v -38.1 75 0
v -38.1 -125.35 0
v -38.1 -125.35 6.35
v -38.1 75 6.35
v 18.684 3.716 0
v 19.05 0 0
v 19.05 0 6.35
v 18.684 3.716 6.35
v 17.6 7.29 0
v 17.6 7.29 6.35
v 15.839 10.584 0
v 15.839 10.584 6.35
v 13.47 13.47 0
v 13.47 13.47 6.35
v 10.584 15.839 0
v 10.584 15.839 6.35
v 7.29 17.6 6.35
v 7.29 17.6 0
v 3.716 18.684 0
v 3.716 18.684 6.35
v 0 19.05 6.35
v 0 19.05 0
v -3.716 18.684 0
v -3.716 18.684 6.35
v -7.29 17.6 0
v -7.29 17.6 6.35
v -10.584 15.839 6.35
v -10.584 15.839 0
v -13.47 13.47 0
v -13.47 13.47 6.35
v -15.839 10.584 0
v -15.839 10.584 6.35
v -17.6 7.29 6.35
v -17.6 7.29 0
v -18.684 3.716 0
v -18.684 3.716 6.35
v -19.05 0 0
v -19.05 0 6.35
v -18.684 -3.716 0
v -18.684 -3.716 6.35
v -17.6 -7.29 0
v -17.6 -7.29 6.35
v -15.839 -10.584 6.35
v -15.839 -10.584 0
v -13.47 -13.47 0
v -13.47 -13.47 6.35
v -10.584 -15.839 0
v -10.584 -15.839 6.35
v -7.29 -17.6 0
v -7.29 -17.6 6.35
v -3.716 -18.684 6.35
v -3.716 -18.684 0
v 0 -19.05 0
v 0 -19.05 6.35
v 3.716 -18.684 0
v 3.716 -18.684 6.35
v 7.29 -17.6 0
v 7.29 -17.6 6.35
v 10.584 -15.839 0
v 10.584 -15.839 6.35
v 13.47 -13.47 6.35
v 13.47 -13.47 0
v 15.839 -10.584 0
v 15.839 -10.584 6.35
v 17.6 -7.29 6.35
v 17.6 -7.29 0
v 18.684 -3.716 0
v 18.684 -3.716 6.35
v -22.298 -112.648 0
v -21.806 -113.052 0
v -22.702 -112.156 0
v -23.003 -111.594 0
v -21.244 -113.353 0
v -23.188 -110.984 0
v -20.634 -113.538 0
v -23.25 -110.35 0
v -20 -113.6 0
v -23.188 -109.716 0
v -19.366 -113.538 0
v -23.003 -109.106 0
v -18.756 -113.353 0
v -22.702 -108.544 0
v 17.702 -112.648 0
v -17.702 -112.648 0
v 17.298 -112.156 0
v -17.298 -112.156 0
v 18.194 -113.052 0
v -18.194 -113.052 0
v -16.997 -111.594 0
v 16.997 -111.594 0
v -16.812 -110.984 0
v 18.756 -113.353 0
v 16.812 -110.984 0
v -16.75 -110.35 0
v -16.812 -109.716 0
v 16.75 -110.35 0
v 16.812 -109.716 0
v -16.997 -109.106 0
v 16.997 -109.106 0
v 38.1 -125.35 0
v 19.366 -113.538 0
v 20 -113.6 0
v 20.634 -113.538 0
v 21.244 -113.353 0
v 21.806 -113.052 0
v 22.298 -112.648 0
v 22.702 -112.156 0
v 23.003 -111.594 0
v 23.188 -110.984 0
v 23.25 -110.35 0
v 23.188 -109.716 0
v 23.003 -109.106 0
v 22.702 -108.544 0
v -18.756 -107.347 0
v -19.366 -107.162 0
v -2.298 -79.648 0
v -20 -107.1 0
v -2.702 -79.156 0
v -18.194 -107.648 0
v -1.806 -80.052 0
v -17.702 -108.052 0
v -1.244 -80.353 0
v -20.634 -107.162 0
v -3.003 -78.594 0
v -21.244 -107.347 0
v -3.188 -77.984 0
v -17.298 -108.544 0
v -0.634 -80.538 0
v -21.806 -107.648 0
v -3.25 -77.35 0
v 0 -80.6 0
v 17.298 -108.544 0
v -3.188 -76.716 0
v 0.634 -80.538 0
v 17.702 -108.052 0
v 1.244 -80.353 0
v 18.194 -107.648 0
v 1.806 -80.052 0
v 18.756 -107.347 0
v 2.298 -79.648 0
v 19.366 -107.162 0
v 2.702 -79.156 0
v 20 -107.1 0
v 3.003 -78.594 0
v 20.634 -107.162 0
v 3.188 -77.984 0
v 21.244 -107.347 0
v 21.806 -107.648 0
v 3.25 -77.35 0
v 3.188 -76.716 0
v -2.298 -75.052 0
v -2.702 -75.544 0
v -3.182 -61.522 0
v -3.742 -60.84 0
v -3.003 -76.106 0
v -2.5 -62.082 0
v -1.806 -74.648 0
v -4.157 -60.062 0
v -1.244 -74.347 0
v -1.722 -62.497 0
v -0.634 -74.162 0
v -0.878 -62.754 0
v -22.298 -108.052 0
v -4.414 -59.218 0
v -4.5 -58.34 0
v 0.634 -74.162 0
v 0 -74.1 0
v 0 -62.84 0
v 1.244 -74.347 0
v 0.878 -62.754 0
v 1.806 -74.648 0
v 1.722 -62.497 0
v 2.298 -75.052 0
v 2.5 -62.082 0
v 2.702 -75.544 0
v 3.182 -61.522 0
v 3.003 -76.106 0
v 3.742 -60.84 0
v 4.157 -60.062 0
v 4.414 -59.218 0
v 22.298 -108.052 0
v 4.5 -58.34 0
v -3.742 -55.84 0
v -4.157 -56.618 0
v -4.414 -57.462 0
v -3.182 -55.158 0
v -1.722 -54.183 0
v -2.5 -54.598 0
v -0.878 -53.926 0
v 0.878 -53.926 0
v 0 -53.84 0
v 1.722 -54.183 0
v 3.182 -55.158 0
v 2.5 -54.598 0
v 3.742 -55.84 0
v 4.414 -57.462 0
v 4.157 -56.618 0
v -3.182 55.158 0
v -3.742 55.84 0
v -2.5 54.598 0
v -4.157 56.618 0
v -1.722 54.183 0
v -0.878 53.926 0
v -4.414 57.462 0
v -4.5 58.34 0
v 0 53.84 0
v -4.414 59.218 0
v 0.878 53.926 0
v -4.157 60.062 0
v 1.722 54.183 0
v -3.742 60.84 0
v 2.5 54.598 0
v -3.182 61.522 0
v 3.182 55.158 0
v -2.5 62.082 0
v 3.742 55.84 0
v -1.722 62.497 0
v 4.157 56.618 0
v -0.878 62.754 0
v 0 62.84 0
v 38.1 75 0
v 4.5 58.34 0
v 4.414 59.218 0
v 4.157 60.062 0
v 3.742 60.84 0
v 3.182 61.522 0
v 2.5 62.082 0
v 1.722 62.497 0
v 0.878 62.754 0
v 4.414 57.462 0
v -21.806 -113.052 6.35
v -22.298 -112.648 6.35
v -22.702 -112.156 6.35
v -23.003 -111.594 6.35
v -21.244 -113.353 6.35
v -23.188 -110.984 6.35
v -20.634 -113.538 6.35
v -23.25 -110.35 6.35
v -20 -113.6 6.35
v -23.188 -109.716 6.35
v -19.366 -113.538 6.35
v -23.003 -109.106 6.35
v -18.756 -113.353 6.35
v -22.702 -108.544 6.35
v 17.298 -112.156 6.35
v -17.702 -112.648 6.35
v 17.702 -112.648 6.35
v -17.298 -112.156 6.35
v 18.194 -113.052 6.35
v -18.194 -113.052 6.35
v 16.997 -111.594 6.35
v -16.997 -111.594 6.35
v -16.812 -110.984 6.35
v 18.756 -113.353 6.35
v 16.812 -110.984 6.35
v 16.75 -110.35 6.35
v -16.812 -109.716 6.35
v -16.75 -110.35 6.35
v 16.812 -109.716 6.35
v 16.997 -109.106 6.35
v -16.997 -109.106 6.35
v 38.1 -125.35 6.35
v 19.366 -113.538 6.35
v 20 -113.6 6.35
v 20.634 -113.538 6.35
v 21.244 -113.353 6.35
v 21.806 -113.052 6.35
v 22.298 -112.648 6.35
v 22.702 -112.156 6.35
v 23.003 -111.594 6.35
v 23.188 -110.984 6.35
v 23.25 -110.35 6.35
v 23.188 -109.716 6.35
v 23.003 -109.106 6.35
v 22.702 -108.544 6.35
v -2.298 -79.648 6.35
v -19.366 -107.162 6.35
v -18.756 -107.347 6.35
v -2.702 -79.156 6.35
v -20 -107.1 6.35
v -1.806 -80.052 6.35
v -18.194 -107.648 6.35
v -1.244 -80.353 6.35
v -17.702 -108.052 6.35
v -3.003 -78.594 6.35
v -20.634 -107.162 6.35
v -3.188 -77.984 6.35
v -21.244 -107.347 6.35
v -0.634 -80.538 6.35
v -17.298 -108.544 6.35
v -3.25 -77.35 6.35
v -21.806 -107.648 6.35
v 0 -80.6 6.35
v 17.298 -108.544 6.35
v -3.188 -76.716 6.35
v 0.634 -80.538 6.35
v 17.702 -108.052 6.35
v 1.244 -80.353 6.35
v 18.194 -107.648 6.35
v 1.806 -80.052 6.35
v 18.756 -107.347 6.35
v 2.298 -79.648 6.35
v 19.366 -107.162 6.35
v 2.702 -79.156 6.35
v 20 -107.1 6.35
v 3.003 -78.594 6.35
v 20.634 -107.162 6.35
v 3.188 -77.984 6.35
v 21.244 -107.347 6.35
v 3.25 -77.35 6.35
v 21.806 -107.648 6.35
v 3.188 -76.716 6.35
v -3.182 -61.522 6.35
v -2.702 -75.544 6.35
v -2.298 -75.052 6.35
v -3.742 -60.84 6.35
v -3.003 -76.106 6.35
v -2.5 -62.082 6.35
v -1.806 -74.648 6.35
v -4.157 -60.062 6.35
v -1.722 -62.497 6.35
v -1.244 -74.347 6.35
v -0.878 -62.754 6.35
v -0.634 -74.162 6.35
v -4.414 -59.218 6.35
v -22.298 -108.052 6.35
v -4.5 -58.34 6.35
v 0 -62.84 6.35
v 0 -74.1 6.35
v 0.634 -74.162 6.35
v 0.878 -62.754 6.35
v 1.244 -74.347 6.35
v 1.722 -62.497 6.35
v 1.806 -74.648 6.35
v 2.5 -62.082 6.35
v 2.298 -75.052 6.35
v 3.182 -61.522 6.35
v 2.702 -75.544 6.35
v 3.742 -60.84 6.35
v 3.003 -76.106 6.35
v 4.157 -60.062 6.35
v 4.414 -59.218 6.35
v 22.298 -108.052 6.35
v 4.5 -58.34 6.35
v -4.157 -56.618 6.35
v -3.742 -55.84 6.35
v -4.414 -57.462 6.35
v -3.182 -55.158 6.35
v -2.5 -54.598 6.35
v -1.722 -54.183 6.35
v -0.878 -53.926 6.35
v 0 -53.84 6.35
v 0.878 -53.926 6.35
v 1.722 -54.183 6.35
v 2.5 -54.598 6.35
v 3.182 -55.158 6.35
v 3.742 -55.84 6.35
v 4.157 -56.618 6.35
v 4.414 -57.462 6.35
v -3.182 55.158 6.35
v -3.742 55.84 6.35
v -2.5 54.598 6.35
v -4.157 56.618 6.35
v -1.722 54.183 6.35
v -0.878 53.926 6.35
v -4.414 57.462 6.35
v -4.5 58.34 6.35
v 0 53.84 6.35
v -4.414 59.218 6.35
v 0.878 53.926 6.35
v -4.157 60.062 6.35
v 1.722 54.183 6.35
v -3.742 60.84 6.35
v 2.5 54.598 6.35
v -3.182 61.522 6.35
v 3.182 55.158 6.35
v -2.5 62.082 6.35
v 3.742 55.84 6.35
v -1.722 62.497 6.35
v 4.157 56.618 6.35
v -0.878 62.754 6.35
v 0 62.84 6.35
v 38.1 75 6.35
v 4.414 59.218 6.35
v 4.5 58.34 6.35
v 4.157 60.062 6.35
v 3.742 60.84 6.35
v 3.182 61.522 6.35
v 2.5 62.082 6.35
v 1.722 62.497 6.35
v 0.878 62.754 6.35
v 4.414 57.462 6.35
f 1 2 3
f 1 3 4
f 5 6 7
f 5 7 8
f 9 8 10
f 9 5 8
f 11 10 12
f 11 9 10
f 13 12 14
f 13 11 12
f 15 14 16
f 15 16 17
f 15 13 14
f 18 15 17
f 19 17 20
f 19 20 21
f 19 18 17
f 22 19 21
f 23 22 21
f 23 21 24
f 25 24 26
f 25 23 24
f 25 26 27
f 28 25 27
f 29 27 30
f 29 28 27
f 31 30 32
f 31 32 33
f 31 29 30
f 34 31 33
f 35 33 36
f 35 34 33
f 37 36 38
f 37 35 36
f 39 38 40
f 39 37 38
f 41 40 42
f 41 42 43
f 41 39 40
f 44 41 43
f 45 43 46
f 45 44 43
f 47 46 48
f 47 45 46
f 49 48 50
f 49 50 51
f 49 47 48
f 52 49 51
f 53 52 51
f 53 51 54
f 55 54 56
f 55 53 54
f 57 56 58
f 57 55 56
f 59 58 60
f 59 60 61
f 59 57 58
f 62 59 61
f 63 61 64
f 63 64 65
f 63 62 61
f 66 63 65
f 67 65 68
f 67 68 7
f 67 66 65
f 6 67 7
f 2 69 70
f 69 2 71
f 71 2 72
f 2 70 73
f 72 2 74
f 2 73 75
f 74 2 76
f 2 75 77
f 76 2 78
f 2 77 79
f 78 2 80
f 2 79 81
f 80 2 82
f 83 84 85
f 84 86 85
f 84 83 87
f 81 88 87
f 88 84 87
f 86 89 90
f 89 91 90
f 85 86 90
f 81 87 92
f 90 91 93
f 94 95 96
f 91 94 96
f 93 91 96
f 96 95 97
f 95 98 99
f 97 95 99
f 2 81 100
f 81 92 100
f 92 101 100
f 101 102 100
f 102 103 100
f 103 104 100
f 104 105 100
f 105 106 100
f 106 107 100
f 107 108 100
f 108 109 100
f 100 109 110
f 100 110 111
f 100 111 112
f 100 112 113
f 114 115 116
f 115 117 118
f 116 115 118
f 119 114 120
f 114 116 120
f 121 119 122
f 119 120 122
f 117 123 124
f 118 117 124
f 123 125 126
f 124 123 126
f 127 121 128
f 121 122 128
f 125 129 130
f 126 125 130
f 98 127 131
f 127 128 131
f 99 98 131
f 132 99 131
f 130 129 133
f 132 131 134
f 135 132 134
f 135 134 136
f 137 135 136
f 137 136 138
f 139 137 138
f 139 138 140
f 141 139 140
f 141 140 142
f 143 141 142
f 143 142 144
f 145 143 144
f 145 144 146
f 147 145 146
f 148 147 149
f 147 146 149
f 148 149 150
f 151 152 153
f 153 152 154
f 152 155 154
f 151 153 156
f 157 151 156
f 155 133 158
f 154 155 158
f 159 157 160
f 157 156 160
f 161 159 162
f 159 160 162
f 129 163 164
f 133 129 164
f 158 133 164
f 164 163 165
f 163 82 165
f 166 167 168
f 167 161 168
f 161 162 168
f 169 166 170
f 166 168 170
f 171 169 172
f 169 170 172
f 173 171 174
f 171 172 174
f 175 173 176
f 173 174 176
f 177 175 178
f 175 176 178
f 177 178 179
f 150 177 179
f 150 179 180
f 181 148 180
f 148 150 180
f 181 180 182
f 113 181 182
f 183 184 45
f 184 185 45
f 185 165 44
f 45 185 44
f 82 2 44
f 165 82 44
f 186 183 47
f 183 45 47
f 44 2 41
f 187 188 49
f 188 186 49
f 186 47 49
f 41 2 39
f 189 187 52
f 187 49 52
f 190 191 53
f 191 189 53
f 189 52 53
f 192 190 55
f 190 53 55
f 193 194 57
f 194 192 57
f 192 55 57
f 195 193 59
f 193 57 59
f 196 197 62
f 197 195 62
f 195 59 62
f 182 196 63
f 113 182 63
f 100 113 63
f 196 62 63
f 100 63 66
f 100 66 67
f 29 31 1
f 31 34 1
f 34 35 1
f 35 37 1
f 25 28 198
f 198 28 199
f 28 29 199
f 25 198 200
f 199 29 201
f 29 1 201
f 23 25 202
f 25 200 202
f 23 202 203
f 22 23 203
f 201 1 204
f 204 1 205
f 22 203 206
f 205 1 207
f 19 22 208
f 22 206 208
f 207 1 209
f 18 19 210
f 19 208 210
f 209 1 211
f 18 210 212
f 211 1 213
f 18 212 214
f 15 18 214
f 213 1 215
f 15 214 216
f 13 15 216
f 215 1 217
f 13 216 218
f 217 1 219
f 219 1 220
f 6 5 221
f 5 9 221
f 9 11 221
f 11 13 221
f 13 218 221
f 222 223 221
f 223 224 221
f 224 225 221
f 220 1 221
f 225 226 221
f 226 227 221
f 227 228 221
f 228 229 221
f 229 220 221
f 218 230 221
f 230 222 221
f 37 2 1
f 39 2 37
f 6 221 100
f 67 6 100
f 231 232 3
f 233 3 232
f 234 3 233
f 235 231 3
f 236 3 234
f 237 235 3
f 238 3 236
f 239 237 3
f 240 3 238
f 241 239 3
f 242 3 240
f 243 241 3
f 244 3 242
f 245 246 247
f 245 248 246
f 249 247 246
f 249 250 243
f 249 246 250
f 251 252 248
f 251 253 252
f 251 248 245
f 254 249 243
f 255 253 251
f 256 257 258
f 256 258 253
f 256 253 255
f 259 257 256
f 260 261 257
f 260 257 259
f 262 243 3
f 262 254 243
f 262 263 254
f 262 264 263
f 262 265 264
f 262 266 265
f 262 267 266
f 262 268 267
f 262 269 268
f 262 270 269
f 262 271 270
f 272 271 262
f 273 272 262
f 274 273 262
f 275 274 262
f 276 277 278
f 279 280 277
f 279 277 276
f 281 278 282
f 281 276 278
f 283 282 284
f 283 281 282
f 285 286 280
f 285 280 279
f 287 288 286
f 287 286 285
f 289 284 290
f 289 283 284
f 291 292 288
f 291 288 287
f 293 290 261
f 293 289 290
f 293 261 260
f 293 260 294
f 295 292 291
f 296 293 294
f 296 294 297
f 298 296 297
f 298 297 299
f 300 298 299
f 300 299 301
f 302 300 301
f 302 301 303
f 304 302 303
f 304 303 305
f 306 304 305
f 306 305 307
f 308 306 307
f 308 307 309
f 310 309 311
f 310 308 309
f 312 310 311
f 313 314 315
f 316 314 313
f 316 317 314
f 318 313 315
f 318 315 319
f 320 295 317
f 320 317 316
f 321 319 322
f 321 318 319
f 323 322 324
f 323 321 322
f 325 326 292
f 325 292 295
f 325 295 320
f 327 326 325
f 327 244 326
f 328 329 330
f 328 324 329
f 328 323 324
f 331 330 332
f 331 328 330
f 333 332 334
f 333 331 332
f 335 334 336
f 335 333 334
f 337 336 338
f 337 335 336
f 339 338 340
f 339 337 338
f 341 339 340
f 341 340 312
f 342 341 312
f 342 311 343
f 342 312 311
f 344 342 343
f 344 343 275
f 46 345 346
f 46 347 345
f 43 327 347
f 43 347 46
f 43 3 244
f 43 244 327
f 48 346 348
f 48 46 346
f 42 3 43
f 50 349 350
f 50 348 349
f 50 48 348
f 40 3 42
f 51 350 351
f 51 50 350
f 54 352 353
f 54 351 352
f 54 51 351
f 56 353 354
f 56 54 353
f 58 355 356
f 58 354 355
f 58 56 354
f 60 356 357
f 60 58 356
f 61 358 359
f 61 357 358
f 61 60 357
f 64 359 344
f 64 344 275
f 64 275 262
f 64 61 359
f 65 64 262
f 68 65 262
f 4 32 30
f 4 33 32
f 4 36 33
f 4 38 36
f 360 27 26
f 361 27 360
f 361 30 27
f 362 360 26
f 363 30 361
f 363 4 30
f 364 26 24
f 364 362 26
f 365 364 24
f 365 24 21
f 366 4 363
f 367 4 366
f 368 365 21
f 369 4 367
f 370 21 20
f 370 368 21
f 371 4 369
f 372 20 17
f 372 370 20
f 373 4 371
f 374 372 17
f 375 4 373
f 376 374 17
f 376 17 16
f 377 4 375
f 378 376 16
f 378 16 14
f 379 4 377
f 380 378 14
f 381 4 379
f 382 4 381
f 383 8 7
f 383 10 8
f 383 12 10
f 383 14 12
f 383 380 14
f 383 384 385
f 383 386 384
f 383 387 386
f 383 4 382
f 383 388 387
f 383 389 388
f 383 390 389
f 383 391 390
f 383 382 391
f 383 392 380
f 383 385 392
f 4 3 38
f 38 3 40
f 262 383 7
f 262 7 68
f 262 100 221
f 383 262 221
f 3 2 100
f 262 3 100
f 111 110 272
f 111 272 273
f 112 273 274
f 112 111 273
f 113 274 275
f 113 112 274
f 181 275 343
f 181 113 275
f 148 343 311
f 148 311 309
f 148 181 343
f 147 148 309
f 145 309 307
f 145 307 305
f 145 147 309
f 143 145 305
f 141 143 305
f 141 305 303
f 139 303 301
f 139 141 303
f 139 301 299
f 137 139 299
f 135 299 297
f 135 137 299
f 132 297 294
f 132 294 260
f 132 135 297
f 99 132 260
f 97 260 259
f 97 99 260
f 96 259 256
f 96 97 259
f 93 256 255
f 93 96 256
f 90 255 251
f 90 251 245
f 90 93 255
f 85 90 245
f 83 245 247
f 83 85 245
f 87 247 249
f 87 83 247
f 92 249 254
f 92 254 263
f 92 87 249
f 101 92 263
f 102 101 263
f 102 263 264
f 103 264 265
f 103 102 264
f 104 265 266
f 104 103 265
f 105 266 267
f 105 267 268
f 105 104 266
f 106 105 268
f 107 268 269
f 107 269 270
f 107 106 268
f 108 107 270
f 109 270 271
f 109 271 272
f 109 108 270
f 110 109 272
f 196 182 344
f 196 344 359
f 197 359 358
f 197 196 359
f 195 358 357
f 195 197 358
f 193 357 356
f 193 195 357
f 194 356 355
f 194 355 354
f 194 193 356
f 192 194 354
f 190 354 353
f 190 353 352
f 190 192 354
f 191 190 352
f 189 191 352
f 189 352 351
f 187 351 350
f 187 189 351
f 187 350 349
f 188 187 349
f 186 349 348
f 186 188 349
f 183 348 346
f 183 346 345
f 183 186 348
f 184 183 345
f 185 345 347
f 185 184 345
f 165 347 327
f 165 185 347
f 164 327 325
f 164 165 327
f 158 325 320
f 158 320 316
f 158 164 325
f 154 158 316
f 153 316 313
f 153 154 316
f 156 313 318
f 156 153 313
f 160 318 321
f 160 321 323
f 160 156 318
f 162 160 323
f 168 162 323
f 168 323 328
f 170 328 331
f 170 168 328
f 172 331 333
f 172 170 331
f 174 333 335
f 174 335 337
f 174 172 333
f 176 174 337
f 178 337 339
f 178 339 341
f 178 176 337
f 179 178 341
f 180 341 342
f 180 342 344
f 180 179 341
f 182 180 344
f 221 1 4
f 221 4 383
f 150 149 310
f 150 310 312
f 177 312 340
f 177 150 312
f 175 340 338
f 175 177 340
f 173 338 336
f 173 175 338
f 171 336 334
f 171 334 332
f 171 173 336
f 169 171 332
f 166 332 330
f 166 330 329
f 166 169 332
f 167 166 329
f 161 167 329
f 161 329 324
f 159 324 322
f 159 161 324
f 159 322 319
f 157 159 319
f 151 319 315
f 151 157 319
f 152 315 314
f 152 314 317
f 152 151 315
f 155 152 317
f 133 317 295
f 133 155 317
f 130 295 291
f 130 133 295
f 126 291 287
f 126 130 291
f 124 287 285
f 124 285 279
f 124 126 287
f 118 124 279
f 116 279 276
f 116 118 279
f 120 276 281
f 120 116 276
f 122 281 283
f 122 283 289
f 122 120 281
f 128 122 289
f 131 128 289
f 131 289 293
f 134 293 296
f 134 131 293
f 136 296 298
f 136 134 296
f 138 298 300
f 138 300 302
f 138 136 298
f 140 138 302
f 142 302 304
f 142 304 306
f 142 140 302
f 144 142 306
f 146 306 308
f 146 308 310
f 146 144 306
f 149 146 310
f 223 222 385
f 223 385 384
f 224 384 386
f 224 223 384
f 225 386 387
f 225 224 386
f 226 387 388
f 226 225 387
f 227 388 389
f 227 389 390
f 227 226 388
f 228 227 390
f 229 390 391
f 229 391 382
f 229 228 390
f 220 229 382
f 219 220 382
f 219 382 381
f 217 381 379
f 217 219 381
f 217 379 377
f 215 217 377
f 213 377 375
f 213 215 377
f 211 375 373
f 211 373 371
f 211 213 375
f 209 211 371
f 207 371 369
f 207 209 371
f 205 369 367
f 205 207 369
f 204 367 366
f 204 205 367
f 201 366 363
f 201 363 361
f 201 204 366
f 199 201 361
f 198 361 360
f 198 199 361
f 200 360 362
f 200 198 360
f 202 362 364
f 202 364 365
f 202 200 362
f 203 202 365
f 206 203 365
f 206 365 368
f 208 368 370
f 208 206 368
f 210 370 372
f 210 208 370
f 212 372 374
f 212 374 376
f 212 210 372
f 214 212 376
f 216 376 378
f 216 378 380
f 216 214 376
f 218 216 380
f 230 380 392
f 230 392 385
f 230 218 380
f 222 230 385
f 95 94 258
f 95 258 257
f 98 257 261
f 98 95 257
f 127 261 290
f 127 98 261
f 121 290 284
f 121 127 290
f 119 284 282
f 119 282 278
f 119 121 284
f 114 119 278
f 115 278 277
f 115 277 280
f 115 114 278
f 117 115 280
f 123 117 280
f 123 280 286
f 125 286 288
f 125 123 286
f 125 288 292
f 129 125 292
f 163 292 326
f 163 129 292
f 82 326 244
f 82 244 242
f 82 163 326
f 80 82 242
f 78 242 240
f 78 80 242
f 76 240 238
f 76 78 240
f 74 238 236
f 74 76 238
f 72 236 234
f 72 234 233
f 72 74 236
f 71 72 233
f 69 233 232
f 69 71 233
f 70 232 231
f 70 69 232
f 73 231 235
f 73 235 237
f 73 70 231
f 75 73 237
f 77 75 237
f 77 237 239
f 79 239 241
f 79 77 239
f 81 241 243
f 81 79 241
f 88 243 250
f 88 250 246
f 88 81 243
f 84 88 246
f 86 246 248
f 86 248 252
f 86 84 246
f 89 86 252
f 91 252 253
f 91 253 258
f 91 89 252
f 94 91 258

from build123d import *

# Parameters (mm, degrees)
SKETCH1_W           = 76.2
SKETCH1_H           = 200.35
SKETCH1_R           = 19.05
SKETCH1_R_2         = 4.5
SKETCH1_R_3         = 3.25
BOSS_EXTRUDE1_DEPTH = 6.35


with BuildPart() as part:
    # Sketch1 → Boss-Extrude1 (new body)
    with BuildSketch(Plane.XY):
        with Locations((0, -25.175)):
            Rectangle(SKETCH1_W, SKETCH1_H)
        Circle(SKETCH1_R, mode=Mode.SUBTRACT)
        with Locations((0, 58.34)):
            Circle(SKETCH1_R_2, mode=Mode.SUBTRACT)
        with Locations((0, -58.34)):
            Circle(SKETCH1_R_2, mode=Mode.SUBTRACT)
        with Locations((-20, -110.35)):
            Circle(SKETCH1_R_3, mode=Mode.SUBTRACT)
        with Locations((20, -110.35)):
            Circle(SKETCH1_R_3, mode=Mode.SUBTRACT)
        with Locations((0, -77.35)):
            Circle(SKETCH1_R_3, mode=Mode.SUBTRACT)
    extrude(amount=BOSS_EXTRUDE1_DEPTH)


solid = part.part
